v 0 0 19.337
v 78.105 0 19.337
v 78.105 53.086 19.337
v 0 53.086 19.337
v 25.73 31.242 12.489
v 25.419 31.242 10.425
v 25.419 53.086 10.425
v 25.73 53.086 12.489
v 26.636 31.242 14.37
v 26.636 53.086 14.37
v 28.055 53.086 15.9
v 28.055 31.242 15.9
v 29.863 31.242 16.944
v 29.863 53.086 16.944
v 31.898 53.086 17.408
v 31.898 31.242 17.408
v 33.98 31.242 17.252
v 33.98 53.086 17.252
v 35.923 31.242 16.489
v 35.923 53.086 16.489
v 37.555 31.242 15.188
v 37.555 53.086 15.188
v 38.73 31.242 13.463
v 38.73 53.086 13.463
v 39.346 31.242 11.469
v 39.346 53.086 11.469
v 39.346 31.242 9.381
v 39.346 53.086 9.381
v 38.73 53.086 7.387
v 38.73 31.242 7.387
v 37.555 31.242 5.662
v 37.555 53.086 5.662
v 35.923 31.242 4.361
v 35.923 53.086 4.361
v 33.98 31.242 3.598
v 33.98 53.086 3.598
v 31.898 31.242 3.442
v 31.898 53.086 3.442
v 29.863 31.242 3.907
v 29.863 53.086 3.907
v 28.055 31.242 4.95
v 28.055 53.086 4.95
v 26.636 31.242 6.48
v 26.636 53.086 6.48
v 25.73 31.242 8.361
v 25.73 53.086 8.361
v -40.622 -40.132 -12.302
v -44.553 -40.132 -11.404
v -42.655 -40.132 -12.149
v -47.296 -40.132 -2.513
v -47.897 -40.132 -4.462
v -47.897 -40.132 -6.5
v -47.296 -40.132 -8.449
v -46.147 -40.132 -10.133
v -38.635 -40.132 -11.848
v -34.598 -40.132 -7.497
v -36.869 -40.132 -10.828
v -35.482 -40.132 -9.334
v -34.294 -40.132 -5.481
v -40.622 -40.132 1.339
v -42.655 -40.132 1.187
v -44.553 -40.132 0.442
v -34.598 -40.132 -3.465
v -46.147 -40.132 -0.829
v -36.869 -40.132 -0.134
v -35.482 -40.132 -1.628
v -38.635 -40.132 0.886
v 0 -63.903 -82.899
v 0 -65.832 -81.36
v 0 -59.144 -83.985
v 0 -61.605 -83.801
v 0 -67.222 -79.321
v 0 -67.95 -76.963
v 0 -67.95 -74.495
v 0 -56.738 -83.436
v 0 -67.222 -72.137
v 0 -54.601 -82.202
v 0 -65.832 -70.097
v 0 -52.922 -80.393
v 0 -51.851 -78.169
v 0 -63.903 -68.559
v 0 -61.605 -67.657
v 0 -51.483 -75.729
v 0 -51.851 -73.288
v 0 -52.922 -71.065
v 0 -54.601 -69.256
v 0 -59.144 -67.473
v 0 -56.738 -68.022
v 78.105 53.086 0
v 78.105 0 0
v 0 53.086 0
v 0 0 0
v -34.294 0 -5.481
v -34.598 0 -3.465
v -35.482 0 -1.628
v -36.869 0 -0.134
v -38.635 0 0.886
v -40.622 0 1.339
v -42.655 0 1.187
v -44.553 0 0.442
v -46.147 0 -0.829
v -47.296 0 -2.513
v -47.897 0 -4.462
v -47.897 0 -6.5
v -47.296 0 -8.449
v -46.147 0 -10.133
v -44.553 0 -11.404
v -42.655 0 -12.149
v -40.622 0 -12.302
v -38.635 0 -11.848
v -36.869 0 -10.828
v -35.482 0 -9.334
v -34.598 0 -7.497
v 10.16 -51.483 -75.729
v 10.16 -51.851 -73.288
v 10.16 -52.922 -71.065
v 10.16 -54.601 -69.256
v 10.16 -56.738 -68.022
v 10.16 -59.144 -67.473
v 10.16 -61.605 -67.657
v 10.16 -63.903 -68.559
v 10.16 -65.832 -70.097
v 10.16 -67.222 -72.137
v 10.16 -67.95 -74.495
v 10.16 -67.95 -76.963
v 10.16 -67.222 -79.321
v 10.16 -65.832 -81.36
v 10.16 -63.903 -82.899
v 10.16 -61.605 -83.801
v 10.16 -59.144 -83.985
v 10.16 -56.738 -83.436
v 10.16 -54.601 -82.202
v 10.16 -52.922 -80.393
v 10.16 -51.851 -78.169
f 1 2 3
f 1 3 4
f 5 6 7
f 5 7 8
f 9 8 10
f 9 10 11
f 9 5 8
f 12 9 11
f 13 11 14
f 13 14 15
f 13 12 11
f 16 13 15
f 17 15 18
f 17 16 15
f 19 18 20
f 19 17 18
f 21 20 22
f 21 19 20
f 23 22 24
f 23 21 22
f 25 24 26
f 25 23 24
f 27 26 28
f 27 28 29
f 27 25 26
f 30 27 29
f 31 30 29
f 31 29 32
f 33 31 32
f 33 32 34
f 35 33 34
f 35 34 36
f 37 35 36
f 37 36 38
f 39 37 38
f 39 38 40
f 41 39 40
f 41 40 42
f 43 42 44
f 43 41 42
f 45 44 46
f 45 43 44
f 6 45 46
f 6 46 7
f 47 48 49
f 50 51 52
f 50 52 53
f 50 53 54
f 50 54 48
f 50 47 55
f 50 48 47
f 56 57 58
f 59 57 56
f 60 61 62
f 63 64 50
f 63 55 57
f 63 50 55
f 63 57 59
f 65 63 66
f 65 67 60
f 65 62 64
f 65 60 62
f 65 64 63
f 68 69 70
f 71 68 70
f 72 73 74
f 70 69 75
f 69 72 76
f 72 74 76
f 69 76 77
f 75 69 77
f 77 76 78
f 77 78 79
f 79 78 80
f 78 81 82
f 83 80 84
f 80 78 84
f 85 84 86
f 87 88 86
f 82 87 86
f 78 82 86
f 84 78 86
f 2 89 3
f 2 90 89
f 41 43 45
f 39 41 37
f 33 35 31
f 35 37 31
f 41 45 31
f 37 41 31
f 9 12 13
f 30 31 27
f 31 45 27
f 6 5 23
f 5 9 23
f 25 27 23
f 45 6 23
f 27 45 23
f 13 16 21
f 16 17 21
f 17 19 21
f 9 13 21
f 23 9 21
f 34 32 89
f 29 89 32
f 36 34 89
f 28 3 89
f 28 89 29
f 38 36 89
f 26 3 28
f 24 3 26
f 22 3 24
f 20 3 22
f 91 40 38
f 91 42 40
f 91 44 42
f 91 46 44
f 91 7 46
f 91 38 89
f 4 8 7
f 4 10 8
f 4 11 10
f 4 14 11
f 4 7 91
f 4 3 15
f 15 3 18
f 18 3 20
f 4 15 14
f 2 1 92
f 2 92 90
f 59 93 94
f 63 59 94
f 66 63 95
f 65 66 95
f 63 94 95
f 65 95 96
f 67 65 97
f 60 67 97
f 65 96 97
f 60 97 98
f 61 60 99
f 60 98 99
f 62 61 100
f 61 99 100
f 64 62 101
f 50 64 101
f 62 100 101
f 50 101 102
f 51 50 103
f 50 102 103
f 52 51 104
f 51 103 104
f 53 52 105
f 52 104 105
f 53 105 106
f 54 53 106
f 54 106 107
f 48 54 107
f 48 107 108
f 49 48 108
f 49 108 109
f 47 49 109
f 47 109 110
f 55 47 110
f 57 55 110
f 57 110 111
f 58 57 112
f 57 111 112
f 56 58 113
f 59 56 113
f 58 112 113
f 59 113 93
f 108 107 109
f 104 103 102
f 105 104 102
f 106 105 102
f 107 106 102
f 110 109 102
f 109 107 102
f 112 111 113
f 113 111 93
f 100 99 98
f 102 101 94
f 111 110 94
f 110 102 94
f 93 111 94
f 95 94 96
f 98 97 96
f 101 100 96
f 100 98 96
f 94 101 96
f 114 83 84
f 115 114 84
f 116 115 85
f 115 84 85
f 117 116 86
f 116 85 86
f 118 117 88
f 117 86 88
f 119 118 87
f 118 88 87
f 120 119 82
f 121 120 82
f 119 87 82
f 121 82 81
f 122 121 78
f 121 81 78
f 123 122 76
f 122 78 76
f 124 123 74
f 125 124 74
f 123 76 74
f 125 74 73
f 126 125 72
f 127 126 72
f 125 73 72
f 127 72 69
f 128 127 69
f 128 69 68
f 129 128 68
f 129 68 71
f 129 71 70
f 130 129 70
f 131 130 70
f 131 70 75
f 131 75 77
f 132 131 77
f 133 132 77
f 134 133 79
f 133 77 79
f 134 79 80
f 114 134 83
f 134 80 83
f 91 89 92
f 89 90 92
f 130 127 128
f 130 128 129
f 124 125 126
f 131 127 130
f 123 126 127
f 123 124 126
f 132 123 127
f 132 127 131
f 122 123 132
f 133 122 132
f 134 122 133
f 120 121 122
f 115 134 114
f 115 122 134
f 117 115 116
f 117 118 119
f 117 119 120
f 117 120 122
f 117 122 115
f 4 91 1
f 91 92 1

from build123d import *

# Parameters (mm, degrees)
F0_W     = 78.104727
F0_H     = 19.33689
F1_DEPTH = 31.242
F2_R     = 6.839642
F3_DEPTH = 40.132
F4_W     = 78.104727
F4_H     = 19.33689
F4_R     = 7.002522
F5_DEPTH = 21.844
F6_R     = 8.27947
F7_DEPTH = 10.16


with BuildPart() as f1:
    # F0 (on Front) → F1 (new body)
    with BuildSketch(Plane.XZ):
        with Locations((39.052363, 9.668445)):
            Rectangle(F0_W, F0_H)
    extrude(amount=-F1_DEPTH)

    # F4 (on face) → F5 (join)
    with BuildSketch(Plane(origin=(0, 31.242, 0), x_dir=(-1, 0, 0), z_dir=(0, 1, 0))):
        with Locations((-39.052363, 9.668445)):
            Rectangle(F4_W, F4_H)
        with Locations((-32.421403, 10.425067)):
            Circle(F4_R, mode=Mode.SUBTRACT)
    extrude(amount=F5_DEPTH)


with BuildPart() as f3:
    # F2 (on Front) → F3 (new body)
    with BuildSketch(Plane.XZ):
        with Locations((-41.133404, -5.481018)):
            Circle(F2_R)
    extrude(amount=F3_DEPTH)


with BuildPart() as f7:
    # F6 (on Right) → F7 (new body)
    with BuildSketch(Plane.YZ):
        with Locations((-59.762951, -75.728841)):
            Circle(F6_R)
    extrude(amount=F7_DEPTH)


solid = Compound([f1.part, f3.part, f7.part])
